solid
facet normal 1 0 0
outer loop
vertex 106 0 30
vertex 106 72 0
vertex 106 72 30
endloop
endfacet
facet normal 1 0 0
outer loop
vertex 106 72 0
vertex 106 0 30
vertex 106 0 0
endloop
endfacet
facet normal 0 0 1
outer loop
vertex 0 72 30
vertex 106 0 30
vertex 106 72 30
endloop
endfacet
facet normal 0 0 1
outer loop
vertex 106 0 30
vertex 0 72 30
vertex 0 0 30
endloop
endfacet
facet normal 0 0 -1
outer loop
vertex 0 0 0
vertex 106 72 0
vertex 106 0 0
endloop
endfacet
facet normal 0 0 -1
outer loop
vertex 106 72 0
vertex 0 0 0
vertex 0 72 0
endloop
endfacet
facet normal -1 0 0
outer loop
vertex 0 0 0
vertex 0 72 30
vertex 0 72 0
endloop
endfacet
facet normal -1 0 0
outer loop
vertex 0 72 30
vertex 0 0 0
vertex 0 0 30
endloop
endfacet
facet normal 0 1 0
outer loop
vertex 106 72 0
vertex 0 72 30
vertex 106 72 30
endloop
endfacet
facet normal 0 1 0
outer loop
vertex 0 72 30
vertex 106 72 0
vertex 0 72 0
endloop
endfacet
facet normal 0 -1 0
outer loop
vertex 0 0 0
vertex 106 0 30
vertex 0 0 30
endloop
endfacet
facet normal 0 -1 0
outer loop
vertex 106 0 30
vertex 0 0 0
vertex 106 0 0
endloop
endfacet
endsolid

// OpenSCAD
// Bench Rack for 1.5 mL Microcentrifuge Tubes
// Designed for FDM printing. Rests on XY plane at Z=0.

// --- Dimensions ---
// Block dimensions
$block_length = 106; // X
$block_width  = 72;  // Y
$block_height = 30;  // Z

// Hole grid configuration
$hole_count_x = 6;   // Holes along X
$hole_count_y = 4;   // Holes along Y
$hole_spacing = 16;  // Centre-to-centre spacing (X and Y)

// Hole dimensions
$hole_diameter = 11.2; // mm
$hole_depth    = 25;   // mm (open top, closed bottom)
$floor_height  = 5;    // mm (solid floor thickness)

// Print settings
$fn = 64; // Smoothness for holes

// --- Main Block ---
difference() {
    // 1. The solid rectangular block
    // Defined from Z=0 to Z=30
    cube([
        $block_length,
        $block_width,
        $block_height
    ]);

    // 2. The holes
    // We subtract cylinders. 
    // To ensure the boolean difference works correctly, the cutting cylinder 
    // must overlap the block's volume. We place the top of the cylinder 
    // slightly above the block's top surface (Z=30) to guarantee overlap.
    
    $cut_height = $hole_depth + 1; // Height 26mm to ensure overlap above and below
    
    for (i = [0 : $hole_count_x - 1]) {
        for (j = [0 : $hole_count_y - 1]) {
            // Calculate position for current hole
            // Grid is centered on the block
            $x_pos = -($block_length / 2) + ($hole_spacing * ($hole_count_x - 1)) / 2 + (i * $hole_spacing);
            $y_pos = -($block_width / 2) + ($hole_spacing * ($hole_count_y - 1)) / 2 + (j * $hole_spacing);
            
            // Cylinder parameters
            $r = $hole_diameter / 2;
            
            // Translate to position. 
            // Top of cylinder is at Z = $block_height + 1 (31).
            // Cylinder extends down by $cut_height (26).
            // This places the cylinder from Z=5 to Z=31.
            // It overlaps the block (Z=0 to Z=30) from Z=5 to Z=30.
            translate([
                $x_pos,
                $y_pos,
                $block_height + 1
            ]) {
                cylinder(
                    h = $cut_height,
                    r1 = $r,
                    r2 = $r,
                    $fn = $fn
                );
            }
        }
    }
}
